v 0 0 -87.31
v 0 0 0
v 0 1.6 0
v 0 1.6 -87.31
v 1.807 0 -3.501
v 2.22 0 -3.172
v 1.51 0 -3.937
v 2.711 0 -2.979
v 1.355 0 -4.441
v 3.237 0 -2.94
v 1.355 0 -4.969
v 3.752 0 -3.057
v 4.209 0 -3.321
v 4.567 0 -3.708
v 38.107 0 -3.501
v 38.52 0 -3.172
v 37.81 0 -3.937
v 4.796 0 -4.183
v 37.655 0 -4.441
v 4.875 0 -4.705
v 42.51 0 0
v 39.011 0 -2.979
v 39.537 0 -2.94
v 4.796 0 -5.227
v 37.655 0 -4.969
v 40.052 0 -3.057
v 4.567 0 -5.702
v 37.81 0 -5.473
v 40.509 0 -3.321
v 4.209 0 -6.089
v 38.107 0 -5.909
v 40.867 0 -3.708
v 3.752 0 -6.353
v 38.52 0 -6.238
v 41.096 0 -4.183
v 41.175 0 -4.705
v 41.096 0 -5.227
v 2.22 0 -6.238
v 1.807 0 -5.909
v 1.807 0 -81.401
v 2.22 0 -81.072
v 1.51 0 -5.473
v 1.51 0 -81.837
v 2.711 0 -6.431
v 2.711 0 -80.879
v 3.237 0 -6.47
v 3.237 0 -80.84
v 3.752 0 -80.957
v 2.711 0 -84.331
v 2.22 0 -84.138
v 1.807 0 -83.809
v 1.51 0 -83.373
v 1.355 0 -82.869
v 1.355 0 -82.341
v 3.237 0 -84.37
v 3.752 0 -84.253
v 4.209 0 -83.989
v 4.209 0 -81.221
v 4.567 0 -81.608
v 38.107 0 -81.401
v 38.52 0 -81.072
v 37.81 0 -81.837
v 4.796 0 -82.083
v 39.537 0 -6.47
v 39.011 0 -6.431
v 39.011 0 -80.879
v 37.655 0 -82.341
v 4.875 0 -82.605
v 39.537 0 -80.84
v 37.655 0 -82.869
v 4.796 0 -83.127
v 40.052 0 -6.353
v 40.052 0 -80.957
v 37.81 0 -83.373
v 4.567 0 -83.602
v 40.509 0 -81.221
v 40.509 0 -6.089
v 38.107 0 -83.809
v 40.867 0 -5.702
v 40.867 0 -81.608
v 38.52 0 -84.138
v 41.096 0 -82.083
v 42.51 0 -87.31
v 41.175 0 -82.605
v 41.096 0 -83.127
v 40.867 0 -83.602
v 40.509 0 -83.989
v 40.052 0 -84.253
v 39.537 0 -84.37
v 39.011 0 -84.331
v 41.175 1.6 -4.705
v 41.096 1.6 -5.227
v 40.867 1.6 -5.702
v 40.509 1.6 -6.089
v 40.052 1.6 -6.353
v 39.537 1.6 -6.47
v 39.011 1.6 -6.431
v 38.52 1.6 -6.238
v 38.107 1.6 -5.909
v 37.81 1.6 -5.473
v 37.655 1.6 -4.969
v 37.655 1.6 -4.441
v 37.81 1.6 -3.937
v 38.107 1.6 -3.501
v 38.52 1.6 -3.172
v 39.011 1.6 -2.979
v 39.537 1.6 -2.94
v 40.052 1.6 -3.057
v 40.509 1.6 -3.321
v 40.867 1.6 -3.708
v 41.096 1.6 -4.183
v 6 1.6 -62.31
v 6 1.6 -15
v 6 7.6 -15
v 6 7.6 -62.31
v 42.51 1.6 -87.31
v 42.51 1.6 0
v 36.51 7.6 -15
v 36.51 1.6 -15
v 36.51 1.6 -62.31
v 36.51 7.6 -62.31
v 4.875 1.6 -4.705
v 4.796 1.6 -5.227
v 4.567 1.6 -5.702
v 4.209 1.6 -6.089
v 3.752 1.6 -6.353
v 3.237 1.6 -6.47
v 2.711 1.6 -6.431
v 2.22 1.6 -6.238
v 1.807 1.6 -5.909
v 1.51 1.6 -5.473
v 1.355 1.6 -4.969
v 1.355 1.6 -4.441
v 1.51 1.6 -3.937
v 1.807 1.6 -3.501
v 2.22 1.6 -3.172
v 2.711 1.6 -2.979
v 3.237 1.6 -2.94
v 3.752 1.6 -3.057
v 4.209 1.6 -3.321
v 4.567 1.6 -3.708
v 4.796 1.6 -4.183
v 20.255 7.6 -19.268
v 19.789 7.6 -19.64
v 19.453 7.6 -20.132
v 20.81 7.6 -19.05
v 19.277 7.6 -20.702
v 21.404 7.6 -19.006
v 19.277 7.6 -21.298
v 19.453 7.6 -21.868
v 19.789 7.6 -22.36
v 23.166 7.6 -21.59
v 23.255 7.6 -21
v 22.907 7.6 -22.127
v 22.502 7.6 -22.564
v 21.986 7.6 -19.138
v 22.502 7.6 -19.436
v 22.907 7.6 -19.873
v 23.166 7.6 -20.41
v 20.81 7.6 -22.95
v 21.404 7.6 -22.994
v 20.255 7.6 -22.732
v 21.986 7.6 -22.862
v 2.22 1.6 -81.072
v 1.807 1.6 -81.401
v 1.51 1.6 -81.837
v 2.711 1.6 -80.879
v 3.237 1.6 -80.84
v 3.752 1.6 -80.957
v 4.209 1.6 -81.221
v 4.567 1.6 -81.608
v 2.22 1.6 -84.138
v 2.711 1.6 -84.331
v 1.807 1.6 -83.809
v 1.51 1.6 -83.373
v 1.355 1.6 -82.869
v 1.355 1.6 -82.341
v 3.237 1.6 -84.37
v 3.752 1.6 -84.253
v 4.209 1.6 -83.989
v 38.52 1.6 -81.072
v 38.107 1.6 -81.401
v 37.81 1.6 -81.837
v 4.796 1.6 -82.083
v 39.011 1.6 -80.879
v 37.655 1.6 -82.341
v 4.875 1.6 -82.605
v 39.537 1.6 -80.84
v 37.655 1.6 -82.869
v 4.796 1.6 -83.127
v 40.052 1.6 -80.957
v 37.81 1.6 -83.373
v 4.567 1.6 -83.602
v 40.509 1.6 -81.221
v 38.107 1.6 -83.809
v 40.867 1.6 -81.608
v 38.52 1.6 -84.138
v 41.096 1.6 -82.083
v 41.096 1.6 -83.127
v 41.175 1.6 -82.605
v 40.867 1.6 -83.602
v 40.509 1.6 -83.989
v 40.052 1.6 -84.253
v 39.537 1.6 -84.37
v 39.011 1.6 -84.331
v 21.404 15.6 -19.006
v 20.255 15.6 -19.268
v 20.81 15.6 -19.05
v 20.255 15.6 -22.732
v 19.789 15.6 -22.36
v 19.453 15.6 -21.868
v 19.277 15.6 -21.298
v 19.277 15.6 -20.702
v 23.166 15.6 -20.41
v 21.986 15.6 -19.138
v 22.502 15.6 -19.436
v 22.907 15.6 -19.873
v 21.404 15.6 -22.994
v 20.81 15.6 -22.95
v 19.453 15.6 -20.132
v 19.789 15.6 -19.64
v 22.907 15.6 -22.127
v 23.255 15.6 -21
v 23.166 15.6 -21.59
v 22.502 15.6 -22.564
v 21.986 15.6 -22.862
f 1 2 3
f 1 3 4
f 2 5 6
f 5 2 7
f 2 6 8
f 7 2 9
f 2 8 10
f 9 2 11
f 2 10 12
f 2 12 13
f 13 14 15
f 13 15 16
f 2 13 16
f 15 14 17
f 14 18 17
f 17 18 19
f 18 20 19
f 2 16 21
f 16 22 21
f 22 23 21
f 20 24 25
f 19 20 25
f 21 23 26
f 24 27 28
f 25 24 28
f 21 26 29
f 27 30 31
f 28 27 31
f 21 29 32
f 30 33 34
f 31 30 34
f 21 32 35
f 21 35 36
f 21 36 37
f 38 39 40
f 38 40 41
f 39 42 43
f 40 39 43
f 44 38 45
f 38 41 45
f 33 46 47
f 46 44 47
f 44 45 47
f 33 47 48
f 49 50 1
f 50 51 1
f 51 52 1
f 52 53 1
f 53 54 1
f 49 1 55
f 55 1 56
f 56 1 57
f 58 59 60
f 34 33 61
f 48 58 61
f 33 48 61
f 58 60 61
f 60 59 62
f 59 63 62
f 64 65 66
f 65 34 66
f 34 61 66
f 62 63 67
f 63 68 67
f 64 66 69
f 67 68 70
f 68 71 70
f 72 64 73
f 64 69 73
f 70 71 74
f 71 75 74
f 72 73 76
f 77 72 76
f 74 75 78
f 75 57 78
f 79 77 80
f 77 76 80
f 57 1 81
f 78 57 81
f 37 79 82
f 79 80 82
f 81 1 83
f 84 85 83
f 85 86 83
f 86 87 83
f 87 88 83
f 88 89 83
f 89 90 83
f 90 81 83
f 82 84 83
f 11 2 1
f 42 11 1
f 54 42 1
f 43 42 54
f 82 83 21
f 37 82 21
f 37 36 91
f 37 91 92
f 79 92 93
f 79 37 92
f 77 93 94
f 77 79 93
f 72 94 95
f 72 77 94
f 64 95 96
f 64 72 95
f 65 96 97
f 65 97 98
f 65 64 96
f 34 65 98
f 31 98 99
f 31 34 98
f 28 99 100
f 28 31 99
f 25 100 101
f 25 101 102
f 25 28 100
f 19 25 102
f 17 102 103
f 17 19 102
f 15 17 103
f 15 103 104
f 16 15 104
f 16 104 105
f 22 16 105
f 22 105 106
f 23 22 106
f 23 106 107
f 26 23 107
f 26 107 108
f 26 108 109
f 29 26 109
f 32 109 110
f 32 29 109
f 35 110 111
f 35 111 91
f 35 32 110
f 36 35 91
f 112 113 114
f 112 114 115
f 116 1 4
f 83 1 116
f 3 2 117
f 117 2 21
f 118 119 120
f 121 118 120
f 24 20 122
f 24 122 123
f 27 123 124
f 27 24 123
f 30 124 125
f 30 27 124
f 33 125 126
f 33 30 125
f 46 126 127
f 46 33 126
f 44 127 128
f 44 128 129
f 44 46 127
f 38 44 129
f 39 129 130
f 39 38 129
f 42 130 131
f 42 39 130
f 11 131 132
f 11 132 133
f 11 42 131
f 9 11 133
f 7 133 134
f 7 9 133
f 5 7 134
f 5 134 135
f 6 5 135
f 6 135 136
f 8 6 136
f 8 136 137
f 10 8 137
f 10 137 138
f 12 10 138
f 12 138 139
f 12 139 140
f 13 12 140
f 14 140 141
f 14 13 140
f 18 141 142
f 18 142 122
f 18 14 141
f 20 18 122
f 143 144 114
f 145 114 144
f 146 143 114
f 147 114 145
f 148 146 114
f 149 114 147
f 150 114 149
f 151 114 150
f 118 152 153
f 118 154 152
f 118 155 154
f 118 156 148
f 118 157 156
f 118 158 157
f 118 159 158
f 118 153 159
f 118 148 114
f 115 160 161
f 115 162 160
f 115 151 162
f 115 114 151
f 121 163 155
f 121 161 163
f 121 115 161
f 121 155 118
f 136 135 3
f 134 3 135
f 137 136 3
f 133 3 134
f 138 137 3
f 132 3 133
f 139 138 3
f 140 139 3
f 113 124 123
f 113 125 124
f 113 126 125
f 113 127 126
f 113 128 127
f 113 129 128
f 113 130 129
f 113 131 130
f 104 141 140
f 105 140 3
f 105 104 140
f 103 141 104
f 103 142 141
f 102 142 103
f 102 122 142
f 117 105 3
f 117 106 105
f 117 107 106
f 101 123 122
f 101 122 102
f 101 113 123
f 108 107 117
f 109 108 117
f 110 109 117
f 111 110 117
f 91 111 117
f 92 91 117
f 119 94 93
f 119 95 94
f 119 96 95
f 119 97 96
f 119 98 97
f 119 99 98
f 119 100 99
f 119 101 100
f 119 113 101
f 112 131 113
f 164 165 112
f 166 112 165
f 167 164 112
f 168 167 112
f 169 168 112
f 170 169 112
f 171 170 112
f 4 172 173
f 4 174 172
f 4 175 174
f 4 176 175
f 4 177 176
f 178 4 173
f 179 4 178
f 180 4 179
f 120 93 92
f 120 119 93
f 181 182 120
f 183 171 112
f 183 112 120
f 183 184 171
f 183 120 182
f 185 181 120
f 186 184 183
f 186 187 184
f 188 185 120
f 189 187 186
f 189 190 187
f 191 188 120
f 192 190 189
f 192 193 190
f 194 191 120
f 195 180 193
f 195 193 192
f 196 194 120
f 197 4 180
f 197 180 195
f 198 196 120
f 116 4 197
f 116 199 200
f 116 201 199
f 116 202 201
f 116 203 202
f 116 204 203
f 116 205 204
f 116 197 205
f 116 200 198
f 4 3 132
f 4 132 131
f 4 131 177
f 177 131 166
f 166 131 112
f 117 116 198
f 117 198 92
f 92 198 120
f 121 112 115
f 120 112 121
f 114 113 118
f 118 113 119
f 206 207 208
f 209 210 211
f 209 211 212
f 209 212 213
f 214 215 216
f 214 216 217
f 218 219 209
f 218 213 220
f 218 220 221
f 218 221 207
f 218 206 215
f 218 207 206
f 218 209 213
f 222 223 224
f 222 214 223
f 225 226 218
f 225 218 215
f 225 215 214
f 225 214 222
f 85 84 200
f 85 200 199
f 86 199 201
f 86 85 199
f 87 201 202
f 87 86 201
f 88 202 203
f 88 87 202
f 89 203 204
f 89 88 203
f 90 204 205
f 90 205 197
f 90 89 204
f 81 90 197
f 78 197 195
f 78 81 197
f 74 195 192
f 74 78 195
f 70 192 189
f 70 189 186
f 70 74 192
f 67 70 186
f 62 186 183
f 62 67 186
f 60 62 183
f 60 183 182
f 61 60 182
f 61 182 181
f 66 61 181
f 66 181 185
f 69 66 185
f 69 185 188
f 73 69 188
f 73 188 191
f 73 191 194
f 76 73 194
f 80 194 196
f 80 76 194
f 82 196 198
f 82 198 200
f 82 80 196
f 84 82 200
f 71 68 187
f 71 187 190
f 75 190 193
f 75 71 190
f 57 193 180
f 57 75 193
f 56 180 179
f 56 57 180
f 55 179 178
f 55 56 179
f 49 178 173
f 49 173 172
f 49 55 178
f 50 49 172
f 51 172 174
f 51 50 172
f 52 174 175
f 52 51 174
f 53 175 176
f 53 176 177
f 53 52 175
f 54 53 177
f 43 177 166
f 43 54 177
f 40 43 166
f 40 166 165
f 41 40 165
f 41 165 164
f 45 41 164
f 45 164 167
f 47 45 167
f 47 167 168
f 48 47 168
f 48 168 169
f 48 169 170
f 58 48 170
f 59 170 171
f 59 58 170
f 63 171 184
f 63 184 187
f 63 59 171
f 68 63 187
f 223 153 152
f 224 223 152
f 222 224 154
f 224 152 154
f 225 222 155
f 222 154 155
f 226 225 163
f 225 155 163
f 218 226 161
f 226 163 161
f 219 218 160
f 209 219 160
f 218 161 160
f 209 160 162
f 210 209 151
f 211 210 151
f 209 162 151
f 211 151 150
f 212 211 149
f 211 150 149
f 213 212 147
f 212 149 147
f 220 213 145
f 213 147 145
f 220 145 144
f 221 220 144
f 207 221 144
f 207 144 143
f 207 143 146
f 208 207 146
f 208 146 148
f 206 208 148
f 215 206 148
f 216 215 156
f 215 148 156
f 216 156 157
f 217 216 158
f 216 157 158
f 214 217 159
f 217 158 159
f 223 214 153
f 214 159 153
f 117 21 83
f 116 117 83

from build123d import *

# Parameters (mm, degrees)
SKETCH1_W           = 42.51
SKETCH1_H           = 87.31
SKETCH1_R           = 1.77
BOSS_EXTRUDE1_DEPTH = 1.6
SKETCH2_W           = 30.51
SKETCH2_H           = 47.31
BOSS_EXTRUDE2_DEPTH = 6
SKETCH4_R           = 2
BOSS_EXTRUDE3_DEPTH = 8


with BuildPart() as part:
    # Sketch1 → Boss-Extrude1 (new body)
    with BuildSketch(Plane(origin=(0, 0, 0), x_dir=(1, 0, 0), z_dir=(0, 1, 0))):
        with Locations((21.255, 43.655)):
            Rectangle(SKETCH1_W, SKETCH1_H)
        with Locations((3.105, 82.605)):
            Circle(SKETCH1_R, mode=Mode.SUBTRACT)
        with Locations((39.405, 82.605)):
            Circle(SKETCH1_R, mode=Mode.SUBTRACT)
        with Locations((3.105, 4.705)):
            Circle(SKETCH1_R, mode=Mode.SUBTRACT)
        with Locations((39.405, 4.705)):
            Circle(SKETCH1_R, mode=Mode.SUBTRACT)
    extrude(amount=BOSS_EXTRUDE1_DEPTH)

    # Sketch2 → Boss-Extrude2 (add)
    with BuildSketch(Plane(origin=(0, 1.6, 0), x_dir=(1, 0, 0), z_dir=(0, 1, 0))):
        with Locations((21.255, 38.655)):
            Rectangle(SKETCH2_W, SKETCH2_H)
    extrude(amount=BOSS_EXTRUDE2_DEPTH)

    # Sketch4 → Boss-Extrude3 (add)
    with BuildSketch(Plane(origin=(0, 7.6, 0), x_dir=(1, 0, 0), z_dir=(0, 1, 0))):
        with Locations((21.255, 21)):
            Circle(SKETCH4_R)
    extrude(amount=BOSS_EXTRUDE3_DEPTH)


solid = part.part
